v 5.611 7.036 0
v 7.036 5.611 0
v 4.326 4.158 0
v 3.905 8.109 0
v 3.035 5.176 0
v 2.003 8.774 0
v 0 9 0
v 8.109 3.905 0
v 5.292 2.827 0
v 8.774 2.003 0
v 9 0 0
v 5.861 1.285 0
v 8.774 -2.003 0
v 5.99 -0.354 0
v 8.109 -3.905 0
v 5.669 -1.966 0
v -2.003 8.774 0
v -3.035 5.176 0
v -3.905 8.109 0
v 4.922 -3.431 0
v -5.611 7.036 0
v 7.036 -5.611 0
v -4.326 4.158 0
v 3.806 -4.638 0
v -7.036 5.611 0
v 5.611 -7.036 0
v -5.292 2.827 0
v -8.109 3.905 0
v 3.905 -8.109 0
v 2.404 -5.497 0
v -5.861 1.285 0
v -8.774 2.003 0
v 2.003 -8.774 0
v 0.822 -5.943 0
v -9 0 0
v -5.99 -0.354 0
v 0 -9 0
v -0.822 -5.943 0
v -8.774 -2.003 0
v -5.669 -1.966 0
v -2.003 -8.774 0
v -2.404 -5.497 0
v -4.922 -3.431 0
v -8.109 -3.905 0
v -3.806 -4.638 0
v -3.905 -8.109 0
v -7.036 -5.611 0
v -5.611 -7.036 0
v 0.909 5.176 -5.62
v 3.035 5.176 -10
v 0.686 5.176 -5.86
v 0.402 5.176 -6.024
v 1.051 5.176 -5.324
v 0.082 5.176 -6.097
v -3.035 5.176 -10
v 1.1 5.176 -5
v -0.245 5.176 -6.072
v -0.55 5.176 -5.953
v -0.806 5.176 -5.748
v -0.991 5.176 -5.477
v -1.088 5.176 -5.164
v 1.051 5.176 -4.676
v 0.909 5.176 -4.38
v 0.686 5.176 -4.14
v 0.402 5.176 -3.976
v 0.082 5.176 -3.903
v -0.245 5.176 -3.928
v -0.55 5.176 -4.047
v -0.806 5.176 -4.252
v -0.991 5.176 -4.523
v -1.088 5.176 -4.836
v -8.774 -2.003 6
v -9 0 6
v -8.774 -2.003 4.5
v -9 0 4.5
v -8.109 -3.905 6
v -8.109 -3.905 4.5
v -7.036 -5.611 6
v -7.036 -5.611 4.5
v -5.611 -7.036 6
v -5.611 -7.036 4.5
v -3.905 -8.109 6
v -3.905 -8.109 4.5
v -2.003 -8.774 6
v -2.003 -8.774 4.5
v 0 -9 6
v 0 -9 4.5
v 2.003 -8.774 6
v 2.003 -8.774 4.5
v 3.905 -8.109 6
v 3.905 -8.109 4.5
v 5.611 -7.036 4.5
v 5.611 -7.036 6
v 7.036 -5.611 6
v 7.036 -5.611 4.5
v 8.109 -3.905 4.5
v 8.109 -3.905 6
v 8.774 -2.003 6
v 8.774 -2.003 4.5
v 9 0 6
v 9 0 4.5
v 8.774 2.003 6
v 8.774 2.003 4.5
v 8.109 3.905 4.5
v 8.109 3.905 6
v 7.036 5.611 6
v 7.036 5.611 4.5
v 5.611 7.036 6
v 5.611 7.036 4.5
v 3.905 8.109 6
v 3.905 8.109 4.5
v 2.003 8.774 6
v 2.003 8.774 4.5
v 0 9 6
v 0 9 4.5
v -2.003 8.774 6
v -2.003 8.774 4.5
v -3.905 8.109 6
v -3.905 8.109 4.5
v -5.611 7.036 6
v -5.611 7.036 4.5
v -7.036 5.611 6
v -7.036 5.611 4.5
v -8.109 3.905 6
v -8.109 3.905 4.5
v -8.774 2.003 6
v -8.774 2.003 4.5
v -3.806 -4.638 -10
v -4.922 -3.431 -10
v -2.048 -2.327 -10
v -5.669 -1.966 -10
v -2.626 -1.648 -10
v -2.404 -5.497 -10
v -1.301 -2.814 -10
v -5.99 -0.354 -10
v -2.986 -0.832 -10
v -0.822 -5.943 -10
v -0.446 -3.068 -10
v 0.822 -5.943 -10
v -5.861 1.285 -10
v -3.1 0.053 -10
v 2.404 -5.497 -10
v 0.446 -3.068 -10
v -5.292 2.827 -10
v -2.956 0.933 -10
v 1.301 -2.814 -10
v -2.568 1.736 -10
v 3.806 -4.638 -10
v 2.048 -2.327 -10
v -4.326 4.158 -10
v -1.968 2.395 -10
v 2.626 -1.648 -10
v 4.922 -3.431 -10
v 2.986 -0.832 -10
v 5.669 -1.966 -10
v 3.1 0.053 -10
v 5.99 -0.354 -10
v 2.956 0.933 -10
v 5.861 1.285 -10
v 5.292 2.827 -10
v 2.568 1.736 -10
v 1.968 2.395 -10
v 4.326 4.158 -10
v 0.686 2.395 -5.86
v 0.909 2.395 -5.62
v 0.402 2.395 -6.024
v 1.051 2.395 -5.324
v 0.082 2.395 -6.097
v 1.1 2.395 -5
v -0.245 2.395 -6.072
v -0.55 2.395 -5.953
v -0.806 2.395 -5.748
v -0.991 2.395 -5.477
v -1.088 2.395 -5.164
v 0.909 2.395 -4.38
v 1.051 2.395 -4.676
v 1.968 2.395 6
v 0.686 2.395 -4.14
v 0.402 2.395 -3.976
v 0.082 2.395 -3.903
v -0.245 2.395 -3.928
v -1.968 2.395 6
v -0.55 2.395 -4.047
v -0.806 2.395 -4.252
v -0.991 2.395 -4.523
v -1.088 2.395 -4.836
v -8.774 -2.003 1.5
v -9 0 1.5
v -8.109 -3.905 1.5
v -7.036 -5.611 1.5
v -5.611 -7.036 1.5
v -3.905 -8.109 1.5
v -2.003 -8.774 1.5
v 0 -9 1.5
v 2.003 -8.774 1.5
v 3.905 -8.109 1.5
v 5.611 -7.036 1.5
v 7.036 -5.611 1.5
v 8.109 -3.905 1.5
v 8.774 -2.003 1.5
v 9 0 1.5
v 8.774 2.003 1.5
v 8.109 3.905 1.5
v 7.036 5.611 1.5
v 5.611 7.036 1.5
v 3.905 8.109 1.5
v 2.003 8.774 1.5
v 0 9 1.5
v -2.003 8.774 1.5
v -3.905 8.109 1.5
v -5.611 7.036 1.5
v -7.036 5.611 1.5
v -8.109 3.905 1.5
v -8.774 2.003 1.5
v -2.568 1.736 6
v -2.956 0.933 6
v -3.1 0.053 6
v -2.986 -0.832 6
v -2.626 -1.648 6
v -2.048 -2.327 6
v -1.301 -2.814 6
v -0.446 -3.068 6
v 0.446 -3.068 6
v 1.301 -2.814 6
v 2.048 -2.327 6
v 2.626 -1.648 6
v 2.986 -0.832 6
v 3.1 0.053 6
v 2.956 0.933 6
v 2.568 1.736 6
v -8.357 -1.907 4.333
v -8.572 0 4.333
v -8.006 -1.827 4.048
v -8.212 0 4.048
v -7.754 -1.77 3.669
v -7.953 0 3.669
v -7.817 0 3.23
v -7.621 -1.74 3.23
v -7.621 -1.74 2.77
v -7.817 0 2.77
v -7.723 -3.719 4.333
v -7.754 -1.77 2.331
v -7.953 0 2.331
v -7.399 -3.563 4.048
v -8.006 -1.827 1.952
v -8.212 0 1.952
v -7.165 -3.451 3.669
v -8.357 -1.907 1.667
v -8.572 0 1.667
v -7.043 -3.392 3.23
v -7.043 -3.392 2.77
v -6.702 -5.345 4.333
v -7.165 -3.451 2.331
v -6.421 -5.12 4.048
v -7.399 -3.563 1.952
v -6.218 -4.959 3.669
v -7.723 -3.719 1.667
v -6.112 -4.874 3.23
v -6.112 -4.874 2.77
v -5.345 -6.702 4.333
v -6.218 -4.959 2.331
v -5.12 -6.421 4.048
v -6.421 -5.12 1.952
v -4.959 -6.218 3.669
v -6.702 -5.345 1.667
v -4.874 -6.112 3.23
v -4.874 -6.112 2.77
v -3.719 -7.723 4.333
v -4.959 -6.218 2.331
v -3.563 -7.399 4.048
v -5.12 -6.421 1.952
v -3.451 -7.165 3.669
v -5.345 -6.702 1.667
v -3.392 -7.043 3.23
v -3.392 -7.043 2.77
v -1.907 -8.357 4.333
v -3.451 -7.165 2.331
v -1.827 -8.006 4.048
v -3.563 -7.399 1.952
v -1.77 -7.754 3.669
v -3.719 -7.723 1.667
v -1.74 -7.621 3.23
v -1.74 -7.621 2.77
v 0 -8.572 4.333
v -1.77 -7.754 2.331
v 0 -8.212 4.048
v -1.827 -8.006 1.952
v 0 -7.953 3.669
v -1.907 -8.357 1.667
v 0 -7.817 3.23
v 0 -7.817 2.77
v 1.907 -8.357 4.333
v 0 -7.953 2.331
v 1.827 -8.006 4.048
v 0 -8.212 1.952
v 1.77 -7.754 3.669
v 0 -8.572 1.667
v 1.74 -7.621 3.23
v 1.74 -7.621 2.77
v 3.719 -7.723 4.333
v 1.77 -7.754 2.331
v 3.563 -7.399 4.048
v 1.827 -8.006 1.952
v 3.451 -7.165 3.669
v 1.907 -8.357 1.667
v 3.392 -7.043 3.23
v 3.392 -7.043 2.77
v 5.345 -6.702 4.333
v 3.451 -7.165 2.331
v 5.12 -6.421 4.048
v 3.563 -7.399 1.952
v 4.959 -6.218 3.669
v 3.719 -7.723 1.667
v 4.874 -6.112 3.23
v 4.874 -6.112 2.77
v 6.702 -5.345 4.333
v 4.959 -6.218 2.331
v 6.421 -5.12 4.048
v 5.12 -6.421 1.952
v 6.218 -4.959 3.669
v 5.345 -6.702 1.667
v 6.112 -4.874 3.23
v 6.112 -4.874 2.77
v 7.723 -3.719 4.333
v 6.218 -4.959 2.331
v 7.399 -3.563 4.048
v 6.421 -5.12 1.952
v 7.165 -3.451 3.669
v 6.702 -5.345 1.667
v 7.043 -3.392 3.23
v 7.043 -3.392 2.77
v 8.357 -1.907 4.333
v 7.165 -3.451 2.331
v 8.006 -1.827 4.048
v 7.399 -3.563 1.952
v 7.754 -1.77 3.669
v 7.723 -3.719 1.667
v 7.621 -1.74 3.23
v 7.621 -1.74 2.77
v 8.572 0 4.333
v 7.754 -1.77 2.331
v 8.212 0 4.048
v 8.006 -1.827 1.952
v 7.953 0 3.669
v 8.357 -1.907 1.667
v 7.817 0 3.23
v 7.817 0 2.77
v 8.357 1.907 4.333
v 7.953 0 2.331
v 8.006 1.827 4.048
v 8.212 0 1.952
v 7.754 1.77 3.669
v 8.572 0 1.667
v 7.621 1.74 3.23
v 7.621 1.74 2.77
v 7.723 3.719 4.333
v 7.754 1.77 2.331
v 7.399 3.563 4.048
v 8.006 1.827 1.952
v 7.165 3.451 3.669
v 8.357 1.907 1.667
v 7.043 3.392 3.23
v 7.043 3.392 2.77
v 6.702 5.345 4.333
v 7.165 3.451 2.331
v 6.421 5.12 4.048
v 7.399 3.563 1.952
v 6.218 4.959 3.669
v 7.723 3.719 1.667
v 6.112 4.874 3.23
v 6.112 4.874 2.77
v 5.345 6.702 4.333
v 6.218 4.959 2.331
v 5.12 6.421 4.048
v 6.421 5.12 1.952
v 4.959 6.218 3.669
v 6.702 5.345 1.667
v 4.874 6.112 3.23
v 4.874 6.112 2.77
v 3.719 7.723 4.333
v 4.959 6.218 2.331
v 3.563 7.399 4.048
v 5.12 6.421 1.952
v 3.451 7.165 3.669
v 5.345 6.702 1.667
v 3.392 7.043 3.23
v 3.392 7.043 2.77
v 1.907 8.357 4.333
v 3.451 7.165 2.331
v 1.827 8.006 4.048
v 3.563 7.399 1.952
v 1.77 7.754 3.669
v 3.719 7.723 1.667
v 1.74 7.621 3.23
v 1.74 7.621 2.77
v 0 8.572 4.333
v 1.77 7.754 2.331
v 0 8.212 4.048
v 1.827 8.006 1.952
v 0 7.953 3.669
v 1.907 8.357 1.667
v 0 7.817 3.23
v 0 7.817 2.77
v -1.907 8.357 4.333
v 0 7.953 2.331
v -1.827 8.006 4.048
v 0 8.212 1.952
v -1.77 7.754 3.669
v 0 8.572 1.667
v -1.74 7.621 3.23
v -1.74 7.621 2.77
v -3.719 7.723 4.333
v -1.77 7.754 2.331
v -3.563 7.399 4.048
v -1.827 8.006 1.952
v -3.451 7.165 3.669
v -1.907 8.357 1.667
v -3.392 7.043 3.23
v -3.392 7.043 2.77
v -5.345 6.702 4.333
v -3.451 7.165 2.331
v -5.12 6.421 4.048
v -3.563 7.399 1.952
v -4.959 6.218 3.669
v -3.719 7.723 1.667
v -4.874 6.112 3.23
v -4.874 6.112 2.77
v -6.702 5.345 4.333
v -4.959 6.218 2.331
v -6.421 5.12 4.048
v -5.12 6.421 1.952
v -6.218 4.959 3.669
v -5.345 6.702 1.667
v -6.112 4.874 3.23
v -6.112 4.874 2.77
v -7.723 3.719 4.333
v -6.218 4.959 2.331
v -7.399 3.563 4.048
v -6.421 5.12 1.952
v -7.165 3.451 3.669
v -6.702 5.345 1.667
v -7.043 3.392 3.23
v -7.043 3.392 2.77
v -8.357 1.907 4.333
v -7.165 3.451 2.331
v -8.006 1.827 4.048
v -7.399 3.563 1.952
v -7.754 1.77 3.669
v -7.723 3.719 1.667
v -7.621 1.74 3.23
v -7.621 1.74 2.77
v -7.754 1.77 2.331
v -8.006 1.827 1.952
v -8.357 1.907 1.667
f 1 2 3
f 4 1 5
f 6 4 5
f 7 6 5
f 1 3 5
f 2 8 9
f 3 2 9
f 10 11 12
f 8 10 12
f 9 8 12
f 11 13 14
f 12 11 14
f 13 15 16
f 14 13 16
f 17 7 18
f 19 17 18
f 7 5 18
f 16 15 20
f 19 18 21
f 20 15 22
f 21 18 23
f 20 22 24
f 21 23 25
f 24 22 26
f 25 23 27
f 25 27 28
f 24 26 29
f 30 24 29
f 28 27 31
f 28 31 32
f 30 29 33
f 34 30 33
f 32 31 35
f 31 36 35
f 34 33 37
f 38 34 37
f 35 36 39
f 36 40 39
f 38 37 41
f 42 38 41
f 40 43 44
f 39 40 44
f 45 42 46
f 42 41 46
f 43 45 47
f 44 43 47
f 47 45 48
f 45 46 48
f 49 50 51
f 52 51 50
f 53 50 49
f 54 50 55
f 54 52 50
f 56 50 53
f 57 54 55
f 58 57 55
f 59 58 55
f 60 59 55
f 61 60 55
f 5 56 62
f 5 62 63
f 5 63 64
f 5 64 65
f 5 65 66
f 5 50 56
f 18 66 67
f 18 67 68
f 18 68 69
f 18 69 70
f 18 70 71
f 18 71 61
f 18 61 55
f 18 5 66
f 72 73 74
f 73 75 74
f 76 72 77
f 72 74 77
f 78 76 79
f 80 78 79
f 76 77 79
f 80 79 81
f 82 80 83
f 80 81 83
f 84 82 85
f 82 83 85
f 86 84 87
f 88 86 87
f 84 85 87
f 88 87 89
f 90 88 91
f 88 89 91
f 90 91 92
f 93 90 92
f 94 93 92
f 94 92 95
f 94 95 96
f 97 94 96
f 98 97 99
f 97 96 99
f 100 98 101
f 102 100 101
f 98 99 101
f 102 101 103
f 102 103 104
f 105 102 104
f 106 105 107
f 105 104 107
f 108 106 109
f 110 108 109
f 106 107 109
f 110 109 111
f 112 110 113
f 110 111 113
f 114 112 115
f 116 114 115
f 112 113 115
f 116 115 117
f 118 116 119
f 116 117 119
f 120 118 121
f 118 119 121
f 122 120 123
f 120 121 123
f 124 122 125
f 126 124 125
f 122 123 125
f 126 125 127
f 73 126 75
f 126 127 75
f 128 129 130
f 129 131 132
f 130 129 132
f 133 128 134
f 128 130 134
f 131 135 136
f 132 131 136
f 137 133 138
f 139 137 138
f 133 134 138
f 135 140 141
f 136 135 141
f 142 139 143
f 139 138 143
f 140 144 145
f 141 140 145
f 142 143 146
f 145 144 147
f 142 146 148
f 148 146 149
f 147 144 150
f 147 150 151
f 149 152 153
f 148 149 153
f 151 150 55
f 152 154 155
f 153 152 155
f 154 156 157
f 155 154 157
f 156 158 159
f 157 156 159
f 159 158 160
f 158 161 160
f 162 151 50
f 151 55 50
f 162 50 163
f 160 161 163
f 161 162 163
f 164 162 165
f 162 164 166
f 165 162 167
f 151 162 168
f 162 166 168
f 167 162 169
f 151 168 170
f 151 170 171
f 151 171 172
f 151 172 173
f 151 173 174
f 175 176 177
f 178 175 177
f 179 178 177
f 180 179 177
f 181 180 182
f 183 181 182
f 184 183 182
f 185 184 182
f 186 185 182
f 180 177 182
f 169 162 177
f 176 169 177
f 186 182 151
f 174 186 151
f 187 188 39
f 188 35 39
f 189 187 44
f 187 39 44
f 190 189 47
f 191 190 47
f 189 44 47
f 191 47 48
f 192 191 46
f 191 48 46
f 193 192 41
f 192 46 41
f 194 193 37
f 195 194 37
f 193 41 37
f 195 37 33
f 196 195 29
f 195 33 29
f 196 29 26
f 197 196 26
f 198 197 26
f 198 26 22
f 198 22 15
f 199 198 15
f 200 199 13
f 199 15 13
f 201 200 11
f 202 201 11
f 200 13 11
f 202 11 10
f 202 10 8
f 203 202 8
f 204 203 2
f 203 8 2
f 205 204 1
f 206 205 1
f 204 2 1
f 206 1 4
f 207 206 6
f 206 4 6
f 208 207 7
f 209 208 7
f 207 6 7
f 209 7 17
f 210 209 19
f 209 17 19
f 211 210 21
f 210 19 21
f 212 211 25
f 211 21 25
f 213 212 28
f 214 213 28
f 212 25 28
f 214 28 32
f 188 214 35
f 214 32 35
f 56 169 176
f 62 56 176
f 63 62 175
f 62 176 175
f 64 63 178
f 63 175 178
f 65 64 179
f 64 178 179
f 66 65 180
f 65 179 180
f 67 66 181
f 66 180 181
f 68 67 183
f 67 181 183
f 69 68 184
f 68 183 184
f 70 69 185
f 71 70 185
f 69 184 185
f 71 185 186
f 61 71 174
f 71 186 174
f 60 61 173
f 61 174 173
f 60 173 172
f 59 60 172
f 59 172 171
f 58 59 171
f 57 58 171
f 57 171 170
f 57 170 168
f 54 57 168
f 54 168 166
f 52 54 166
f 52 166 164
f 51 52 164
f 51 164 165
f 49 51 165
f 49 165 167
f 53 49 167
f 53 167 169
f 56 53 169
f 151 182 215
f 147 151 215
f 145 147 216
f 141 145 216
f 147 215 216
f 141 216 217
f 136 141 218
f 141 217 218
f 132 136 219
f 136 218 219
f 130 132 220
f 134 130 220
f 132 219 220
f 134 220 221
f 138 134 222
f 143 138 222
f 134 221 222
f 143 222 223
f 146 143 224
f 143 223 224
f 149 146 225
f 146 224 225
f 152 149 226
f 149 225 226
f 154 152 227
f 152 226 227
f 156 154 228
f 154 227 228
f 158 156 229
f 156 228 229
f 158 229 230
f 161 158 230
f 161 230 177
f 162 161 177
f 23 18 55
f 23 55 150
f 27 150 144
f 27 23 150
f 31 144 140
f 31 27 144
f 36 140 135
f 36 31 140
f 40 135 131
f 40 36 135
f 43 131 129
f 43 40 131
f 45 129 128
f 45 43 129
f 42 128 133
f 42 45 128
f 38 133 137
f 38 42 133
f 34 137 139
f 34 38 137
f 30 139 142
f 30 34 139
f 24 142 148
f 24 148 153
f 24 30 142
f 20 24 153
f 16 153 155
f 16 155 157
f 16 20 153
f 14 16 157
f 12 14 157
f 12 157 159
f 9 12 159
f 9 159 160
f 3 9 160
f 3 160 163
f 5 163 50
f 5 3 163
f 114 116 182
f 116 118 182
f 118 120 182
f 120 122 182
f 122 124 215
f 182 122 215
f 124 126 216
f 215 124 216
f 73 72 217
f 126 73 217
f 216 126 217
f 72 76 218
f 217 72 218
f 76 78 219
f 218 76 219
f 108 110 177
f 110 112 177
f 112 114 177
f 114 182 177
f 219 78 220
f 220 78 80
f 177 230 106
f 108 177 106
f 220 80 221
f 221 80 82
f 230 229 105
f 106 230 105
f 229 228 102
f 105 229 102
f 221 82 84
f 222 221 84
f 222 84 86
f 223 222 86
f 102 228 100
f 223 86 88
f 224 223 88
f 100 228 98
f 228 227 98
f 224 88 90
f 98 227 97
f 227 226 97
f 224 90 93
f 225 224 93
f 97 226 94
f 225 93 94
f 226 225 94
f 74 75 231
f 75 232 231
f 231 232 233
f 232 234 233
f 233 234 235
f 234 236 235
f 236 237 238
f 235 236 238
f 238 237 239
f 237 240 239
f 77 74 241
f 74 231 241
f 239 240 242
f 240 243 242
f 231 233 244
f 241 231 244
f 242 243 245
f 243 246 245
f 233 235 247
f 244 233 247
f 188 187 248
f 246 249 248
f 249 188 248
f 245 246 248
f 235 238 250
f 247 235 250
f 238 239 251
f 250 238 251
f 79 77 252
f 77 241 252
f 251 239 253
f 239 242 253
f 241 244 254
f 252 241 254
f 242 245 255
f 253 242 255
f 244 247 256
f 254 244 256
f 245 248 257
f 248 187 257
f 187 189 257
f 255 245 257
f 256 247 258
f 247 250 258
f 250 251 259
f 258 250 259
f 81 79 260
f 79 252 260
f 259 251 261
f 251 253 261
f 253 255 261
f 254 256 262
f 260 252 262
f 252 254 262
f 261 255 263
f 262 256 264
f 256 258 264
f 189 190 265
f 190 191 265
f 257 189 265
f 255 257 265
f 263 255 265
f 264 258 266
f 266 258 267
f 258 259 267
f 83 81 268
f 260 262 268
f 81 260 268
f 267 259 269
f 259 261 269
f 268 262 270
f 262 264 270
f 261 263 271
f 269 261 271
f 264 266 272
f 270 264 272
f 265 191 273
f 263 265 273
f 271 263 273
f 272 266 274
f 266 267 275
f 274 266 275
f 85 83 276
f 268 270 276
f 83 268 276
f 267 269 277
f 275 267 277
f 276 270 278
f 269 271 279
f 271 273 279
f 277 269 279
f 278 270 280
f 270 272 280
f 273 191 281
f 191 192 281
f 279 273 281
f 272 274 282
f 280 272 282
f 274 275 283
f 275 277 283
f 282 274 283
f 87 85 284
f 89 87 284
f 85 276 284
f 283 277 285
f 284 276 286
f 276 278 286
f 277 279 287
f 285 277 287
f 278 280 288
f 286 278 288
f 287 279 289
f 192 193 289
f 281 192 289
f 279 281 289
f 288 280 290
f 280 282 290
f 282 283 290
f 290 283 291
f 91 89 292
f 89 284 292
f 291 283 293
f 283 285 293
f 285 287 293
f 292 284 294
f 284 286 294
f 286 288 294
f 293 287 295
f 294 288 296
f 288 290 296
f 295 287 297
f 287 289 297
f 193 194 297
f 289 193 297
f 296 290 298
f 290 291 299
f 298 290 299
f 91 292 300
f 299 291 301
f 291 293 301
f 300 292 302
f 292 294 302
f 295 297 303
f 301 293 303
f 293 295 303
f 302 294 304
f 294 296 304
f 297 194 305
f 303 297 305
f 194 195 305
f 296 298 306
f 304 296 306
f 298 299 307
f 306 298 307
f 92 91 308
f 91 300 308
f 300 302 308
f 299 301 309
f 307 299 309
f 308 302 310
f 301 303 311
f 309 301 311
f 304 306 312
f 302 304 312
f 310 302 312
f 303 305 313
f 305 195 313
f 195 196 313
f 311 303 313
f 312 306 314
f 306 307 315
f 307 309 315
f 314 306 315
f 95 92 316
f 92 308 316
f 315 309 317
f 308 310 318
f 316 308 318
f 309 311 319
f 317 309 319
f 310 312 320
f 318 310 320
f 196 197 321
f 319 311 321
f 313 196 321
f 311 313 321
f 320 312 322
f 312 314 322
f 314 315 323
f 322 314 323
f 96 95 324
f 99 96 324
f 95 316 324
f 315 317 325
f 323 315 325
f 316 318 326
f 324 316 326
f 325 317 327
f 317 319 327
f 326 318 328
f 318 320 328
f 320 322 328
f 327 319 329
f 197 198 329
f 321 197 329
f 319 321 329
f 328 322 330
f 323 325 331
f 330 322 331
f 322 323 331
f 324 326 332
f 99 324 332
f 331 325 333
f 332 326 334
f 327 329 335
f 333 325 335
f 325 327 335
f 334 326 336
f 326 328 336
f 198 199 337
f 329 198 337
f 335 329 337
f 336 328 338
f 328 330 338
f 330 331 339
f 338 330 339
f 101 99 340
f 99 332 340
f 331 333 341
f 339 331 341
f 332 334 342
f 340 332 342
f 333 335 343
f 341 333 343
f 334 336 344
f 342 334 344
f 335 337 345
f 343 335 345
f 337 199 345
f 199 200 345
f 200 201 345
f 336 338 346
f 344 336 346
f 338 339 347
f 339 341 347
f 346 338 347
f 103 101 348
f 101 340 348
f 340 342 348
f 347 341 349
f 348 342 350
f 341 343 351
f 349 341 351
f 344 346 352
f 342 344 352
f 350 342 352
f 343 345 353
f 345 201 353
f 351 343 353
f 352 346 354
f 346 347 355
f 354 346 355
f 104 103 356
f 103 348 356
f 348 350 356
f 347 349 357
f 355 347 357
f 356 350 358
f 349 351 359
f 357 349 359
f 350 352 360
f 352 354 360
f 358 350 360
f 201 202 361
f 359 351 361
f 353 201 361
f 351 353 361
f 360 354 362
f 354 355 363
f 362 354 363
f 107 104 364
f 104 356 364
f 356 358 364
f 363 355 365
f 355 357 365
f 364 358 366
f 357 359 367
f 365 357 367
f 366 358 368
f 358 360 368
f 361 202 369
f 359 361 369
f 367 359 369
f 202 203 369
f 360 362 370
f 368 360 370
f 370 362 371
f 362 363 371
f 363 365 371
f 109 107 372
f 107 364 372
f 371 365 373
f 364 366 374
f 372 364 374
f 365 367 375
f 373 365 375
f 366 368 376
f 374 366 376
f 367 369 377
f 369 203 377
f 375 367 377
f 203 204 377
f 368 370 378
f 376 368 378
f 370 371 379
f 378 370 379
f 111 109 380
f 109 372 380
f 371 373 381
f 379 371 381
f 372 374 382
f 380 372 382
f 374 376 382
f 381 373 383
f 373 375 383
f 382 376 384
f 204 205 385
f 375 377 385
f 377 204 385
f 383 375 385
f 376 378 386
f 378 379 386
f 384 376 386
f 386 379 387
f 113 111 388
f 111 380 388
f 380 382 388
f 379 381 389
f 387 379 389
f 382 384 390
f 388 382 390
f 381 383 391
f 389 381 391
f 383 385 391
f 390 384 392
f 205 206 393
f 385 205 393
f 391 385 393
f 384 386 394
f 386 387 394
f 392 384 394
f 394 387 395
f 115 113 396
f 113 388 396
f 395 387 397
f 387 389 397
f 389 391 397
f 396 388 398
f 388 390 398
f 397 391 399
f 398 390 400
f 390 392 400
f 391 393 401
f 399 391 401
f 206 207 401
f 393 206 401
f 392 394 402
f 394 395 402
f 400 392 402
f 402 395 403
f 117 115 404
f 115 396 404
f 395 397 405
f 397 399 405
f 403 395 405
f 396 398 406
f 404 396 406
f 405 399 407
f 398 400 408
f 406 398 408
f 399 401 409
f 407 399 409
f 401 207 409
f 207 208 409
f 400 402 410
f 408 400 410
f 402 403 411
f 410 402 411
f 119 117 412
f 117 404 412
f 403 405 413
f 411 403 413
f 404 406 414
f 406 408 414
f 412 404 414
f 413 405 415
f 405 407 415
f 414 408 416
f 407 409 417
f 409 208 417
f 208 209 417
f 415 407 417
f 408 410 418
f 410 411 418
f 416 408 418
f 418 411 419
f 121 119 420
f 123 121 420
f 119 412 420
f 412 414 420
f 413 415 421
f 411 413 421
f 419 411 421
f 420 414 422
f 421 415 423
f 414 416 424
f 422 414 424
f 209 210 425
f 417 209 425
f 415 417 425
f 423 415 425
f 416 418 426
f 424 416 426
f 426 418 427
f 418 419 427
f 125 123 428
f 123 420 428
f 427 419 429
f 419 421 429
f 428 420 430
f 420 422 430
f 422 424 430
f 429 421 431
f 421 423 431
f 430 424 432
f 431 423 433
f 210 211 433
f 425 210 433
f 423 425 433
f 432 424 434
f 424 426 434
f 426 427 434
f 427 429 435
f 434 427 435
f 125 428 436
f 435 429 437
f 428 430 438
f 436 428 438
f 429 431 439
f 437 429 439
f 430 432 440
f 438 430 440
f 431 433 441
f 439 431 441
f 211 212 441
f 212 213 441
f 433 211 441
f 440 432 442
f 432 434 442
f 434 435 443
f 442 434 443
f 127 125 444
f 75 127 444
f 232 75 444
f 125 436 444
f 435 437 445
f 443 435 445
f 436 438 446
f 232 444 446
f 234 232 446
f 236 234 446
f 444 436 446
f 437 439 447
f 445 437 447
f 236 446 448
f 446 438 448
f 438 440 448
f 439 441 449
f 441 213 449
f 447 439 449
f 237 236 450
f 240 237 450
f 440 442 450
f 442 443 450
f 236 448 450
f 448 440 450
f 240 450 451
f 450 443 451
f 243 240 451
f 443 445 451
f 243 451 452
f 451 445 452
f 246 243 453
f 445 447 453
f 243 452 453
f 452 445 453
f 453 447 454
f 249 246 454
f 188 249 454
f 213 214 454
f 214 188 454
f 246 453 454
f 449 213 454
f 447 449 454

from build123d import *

# Parameters (mm, degrees)
F4_DEPTH = 10
F5_DEPTH = 16.001
F7_D     = 2.2
F7_DEPTH = 4


with BuildPart() as f1:
    # F0 (on Front) → F1 (revolve)
    with BuildSketch(Plane.XZ):
        with BuildLine():
            Line((-9, 0), (0, 0))
            Line((0, 0), (0, 6))
            Line((0, 6), (-9, 6))
            Line((-9, 6), (-9, 4.5))
            ThreePointArc((-9, 4.5), (-7.8, 3), (-9, 1.5))
            Line((-9, 1.5), (-9, 0))
        make_face()
    revolve(axis=Axis((0, 0, 3), (0, 0, 1)))

    # F3 (on Top) → F4 (join)
    with BuildSketch(Plane.XY):
        with BuildLine():
            Line((3.0351, 5.175729), (-3.0351, 5.175729))
            ThreePointArc((-3.0351, 5.175729), (0, -6), (3.0351, 5.175729))
        make_face()
    extrude(amount=-F4_DEPTH)

    # F2 (on face) → F5 (cut, through all)
    with BuildSketch(Plane.XY.offset(6)):
        with BuildLine():
            Line((1.967733, 2.395418), (-1.967733, 2.395418))
            ThreePointArc((-1.967733, 2.395418), (0, -3.1), (1.967733, 2.395418))
        make_face()
    extrude(amount=-F5_DEPTH, mode=Mode.SUBTRACT)

    # F7
    with Locations(Plane(origin=(0, 5.175729, 0), x_dir=(-1, 0, 0), z_dir=(0, 1, 0))):
        with Locations((0, -5)):
            Hole(F7_D / 2, depth=F7_DEPTH)


solid = f1.part
